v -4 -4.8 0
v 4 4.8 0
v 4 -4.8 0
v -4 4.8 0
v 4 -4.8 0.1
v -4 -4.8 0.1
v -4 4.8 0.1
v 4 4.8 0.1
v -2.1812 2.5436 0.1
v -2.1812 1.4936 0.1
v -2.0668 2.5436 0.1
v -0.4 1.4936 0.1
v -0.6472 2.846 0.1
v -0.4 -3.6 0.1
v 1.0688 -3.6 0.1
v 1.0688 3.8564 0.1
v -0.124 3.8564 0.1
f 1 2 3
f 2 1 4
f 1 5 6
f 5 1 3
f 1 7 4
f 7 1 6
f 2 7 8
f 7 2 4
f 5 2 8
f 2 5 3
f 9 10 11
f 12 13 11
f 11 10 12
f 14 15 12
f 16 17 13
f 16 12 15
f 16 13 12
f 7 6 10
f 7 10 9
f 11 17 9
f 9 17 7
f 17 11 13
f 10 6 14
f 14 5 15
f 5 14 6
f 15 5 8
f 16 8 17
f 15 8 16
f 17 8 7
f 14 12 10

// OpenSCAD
// file: ../p/box5-12.scad
use <../lib.scad>
function ldraw_lib__box5_12() = [
// 0 Box with 5 Faces without Any Edges
// 0 Name: box5-12.dat
// 0 Author: Chris Dee [cwdee]
// 0 !LDRAW_ORG Primitive UPDATE 2009-02
// 0 !LICENSE Licensed under CC BY 2.0 and CC BY 4.0 : see CAreadme.txt
// 
// 0 BFC CERTIFY CCW
  [0,"BFC","CERTIFY"],
  [0,"BFC","CCW"],
// 
// 0 !HISTORY 2009-09-03 [PTadmin] Official Update 2009-02
// 
// 
// 4 16 1 1 1 1 1 -1 -1 1 -1 -1 1 1
  [4,16,1,1,1,1,1,-1,-1,1,-1,-1,1,1],
// 4 16 -1 0 1 1 0 1 1 1 1 -1 1 1
  [4,16,-1,0,1,1,0,1,1,1,1,-1,1,1],
// 4 16 -1 0 -1 -1 0 1 -1 1 1 -1 1 -1
  [4,16,-1,0,-1,-1,0,1,-1,1,1,-1,1,-1],
// 4 16 1 0 -1 -1 0 -1 -1 1 -1 1 1 -1
  [4,16,1,0,-1,-1,0,-1,-1,1,-1,1,1,-1],
// 4 16 1 0 1 1 0 -1 1 1 -1 1 1 1
  [4,16,1,0,1,1,0,-1,1,1,-1,1,1,1],
// 0
];
module ldraw_lib__box5_12(step=0, col=false, unit=2/5, alt=false, line=0.2, solid=!$preview)
    makepoly(ldraw_lib__box5_12(), step=step, col=col, unit=unit, alt=alt, line=line, solid=solid);
ldraw_lib__box5_12(line=0.2);
// main file
use <../lib.scad>
use <../p/box5-12.scad>
function ldraw_lib__191915g() = [
// 0 Sticker  1.2 x  1 with Green "1"
// 0 Name: 191915g.dat
// 0 Author: Steffen [Steffen]
// 0 !LDRAW_ORG Part UPDATE 2012-01
// 0 !LICENSE Licensed under CC BY 2.0 and CC BY 4.0 : see CAreadme.txt
// 
// 0 BFC CERTIFY CCW
  [0,"BFC","CERTIFY"],
  [0,"BFC","CCW"],
// 
// 0 !KEYWORDS set 7740
// 
// 0 !HISTORY 2012-03-30 [PTadmin] Official Update 2012-01
// 
// 
// 1 16 0 -0.25 0 10 0 0 0 0.25 0 0 0 -12 box5-12.dat
  [1,16,0,-0.25,0,10,0,0,0,0.25,0,0,0,-12, ldraw_lib__box5_12()],
// 3 2 -5.453 -0.25 6.359 -5.453 -0.25 3.734 -5.167 -0.25 6.359
  [3,2,-5.453,-0.25,6.359,-5.453,-0.25,3.734,-5.167,-0.25,6.359],
// 3 2 -1 -0.25 3.734 -1.618 -0.25 7.115 -5.167 -0.25 6.359
  [3,2,-1,-0.25,3.734,-1.618,-0.25,7.115,-5.167,-0.25,6.359],
// 3 2 -5.167 -0.25 6.359 -5.453 -0.25 3.734 -1 -0.25 3.734
  [3,2,-5.167,-0.25,6.359,-5.453,-0.25,3.734,-1,-0.25,3.734],
// 3 2 -1 -0.25 -9 2.672 -0.25 -9 -1 -0.25 3.734
  [3,2,-1,-0.25,-9,2.672,-0.25,-9,-1,-0.25,3.734],
// 3 2 2.672 -0.25 9.641 -0.31 -0.25 9.641 -1.618 -0.25 7.115
  [3,2,2.672,-0.25,9.641,-0.31,-0.25,9.641,-1.618,-0.25,7.115],
// 3 2 2.672 -0.25 9.641 -1 -0.25 3.734 2.672 -0.25 -9
  [3,2,2.672,-0.25,9.641,-1,-0.25,3.734,2.672,-0.25,-9],
// 3 2 2.672 -0.25 9.641 -1.618 -0.25 7.115 -1 -0.25 3.734
  [3,2,2.672,-0.25,9.641,-1.618,-0.25,7.115,-1,-0.25,3.734],
// 3 16 -10 -0.25 12 -10 -0.25 -12 -5.453 -0.25 3.734
  [3,16,-10,-0.25,12,-10,-0.25,-12,-5.453,-0.25,3.734],
// 3 16 -10 -0.25 12 -5.453 -0.25 3.734 -5.453 -0.25 6.359
  [3,16,-10,-0.25,12,-5.453,-0.25,3.734,-5.453,-0.25,6.359],
// 3 16 -5.167 -0.25 6.359 -0.31 -0.25 9.641 -5.453 -0.25 6.359
  [3,16,-5.167,-0.25,6.359,-0.31,-0.25,9.641,-5.453,-0.25,6.359],
// 3 16 -5.453 -0.25 6.359 -0.31 -0.25 9.641 -10 -0.25 12
  [3,16,-5.453,-0.25,6.359,-0.31,-0.25,9.641,-10,-0.25,12],
// 3 16 -0.31 -0.25 9.641 -5.167 -0.25 6.359 -1.618 -0.25 7.115
  [3,16,-0.31,-0.25,9.641,-5.167,-0.25,6.359,-1.618,-0.25,7.115],
// 3 16 -5.453 -0.25 3.734 -10 -0.25 -12 -1 -0.25 -9
  [3,16,-5.453,-0.25,3.734,-10,-0.25,-12,-1,-0.25,-9],
// 3 16 -1 -0.25 -9 10 -0.25 -12 2.672 -0.25 -9
  [3,16,-1,-0.25,-9,10,-0.25,-12,2.672,-0.25,-9],
// 3 16 10 -0.25 -12 -1 -0.25 -9 -10 -0.25 -12
  [3,16,10,-0.25,-12,-1,-0.25,-9,-10,-0.25,-12],
// 3 16 2.672 -0.25 -9 10 -0.25 -12 10 -0.25 12
  [3,16,2.672,-0.25,-9,10,-0.25,-12,10,-0.25,12],
// 3 16 2.672 -0.25 9.641 10 -0.25 12 -0.31 -0.25 9.641
  [3,16,2.672,-0.25,9.641,10,-0.25,12,-0.31,-0.25,9.641],
// 3 16 2.672 -0.25 -9 10 -0.25 12 2.672 -0.25 9.641
  [3,16,2.672,-0.25,-9,10,-0.25,12,2.672,-0.25,9.641],
// 3 16 -0.31 -0.25 9.641 10 -0.25 12 -10 -0.25 12
  [3,16,-0.31,-0.25,9.641,10,-0.25,12,-10,-0.25,12],
// 3 16 -1 -0.25 -9 -1 -0.25 3.734 -5.453 -0.25 3.734
  [3,16,-1,-0.25,-9,-1,-0.25,3.734,-5.453,-0.25,3.734],
];
module ldraw_lib__191915g(step=0, col=false, unit=2/5, alt=false, line=0.2, solid=!$preview)
    makepoly(ldraw_lib__191915g(), step=step, col=col, unit=unit, alt=alt, line=line, solid=solid);
ldraw_lib__191915g(line=0.2);
